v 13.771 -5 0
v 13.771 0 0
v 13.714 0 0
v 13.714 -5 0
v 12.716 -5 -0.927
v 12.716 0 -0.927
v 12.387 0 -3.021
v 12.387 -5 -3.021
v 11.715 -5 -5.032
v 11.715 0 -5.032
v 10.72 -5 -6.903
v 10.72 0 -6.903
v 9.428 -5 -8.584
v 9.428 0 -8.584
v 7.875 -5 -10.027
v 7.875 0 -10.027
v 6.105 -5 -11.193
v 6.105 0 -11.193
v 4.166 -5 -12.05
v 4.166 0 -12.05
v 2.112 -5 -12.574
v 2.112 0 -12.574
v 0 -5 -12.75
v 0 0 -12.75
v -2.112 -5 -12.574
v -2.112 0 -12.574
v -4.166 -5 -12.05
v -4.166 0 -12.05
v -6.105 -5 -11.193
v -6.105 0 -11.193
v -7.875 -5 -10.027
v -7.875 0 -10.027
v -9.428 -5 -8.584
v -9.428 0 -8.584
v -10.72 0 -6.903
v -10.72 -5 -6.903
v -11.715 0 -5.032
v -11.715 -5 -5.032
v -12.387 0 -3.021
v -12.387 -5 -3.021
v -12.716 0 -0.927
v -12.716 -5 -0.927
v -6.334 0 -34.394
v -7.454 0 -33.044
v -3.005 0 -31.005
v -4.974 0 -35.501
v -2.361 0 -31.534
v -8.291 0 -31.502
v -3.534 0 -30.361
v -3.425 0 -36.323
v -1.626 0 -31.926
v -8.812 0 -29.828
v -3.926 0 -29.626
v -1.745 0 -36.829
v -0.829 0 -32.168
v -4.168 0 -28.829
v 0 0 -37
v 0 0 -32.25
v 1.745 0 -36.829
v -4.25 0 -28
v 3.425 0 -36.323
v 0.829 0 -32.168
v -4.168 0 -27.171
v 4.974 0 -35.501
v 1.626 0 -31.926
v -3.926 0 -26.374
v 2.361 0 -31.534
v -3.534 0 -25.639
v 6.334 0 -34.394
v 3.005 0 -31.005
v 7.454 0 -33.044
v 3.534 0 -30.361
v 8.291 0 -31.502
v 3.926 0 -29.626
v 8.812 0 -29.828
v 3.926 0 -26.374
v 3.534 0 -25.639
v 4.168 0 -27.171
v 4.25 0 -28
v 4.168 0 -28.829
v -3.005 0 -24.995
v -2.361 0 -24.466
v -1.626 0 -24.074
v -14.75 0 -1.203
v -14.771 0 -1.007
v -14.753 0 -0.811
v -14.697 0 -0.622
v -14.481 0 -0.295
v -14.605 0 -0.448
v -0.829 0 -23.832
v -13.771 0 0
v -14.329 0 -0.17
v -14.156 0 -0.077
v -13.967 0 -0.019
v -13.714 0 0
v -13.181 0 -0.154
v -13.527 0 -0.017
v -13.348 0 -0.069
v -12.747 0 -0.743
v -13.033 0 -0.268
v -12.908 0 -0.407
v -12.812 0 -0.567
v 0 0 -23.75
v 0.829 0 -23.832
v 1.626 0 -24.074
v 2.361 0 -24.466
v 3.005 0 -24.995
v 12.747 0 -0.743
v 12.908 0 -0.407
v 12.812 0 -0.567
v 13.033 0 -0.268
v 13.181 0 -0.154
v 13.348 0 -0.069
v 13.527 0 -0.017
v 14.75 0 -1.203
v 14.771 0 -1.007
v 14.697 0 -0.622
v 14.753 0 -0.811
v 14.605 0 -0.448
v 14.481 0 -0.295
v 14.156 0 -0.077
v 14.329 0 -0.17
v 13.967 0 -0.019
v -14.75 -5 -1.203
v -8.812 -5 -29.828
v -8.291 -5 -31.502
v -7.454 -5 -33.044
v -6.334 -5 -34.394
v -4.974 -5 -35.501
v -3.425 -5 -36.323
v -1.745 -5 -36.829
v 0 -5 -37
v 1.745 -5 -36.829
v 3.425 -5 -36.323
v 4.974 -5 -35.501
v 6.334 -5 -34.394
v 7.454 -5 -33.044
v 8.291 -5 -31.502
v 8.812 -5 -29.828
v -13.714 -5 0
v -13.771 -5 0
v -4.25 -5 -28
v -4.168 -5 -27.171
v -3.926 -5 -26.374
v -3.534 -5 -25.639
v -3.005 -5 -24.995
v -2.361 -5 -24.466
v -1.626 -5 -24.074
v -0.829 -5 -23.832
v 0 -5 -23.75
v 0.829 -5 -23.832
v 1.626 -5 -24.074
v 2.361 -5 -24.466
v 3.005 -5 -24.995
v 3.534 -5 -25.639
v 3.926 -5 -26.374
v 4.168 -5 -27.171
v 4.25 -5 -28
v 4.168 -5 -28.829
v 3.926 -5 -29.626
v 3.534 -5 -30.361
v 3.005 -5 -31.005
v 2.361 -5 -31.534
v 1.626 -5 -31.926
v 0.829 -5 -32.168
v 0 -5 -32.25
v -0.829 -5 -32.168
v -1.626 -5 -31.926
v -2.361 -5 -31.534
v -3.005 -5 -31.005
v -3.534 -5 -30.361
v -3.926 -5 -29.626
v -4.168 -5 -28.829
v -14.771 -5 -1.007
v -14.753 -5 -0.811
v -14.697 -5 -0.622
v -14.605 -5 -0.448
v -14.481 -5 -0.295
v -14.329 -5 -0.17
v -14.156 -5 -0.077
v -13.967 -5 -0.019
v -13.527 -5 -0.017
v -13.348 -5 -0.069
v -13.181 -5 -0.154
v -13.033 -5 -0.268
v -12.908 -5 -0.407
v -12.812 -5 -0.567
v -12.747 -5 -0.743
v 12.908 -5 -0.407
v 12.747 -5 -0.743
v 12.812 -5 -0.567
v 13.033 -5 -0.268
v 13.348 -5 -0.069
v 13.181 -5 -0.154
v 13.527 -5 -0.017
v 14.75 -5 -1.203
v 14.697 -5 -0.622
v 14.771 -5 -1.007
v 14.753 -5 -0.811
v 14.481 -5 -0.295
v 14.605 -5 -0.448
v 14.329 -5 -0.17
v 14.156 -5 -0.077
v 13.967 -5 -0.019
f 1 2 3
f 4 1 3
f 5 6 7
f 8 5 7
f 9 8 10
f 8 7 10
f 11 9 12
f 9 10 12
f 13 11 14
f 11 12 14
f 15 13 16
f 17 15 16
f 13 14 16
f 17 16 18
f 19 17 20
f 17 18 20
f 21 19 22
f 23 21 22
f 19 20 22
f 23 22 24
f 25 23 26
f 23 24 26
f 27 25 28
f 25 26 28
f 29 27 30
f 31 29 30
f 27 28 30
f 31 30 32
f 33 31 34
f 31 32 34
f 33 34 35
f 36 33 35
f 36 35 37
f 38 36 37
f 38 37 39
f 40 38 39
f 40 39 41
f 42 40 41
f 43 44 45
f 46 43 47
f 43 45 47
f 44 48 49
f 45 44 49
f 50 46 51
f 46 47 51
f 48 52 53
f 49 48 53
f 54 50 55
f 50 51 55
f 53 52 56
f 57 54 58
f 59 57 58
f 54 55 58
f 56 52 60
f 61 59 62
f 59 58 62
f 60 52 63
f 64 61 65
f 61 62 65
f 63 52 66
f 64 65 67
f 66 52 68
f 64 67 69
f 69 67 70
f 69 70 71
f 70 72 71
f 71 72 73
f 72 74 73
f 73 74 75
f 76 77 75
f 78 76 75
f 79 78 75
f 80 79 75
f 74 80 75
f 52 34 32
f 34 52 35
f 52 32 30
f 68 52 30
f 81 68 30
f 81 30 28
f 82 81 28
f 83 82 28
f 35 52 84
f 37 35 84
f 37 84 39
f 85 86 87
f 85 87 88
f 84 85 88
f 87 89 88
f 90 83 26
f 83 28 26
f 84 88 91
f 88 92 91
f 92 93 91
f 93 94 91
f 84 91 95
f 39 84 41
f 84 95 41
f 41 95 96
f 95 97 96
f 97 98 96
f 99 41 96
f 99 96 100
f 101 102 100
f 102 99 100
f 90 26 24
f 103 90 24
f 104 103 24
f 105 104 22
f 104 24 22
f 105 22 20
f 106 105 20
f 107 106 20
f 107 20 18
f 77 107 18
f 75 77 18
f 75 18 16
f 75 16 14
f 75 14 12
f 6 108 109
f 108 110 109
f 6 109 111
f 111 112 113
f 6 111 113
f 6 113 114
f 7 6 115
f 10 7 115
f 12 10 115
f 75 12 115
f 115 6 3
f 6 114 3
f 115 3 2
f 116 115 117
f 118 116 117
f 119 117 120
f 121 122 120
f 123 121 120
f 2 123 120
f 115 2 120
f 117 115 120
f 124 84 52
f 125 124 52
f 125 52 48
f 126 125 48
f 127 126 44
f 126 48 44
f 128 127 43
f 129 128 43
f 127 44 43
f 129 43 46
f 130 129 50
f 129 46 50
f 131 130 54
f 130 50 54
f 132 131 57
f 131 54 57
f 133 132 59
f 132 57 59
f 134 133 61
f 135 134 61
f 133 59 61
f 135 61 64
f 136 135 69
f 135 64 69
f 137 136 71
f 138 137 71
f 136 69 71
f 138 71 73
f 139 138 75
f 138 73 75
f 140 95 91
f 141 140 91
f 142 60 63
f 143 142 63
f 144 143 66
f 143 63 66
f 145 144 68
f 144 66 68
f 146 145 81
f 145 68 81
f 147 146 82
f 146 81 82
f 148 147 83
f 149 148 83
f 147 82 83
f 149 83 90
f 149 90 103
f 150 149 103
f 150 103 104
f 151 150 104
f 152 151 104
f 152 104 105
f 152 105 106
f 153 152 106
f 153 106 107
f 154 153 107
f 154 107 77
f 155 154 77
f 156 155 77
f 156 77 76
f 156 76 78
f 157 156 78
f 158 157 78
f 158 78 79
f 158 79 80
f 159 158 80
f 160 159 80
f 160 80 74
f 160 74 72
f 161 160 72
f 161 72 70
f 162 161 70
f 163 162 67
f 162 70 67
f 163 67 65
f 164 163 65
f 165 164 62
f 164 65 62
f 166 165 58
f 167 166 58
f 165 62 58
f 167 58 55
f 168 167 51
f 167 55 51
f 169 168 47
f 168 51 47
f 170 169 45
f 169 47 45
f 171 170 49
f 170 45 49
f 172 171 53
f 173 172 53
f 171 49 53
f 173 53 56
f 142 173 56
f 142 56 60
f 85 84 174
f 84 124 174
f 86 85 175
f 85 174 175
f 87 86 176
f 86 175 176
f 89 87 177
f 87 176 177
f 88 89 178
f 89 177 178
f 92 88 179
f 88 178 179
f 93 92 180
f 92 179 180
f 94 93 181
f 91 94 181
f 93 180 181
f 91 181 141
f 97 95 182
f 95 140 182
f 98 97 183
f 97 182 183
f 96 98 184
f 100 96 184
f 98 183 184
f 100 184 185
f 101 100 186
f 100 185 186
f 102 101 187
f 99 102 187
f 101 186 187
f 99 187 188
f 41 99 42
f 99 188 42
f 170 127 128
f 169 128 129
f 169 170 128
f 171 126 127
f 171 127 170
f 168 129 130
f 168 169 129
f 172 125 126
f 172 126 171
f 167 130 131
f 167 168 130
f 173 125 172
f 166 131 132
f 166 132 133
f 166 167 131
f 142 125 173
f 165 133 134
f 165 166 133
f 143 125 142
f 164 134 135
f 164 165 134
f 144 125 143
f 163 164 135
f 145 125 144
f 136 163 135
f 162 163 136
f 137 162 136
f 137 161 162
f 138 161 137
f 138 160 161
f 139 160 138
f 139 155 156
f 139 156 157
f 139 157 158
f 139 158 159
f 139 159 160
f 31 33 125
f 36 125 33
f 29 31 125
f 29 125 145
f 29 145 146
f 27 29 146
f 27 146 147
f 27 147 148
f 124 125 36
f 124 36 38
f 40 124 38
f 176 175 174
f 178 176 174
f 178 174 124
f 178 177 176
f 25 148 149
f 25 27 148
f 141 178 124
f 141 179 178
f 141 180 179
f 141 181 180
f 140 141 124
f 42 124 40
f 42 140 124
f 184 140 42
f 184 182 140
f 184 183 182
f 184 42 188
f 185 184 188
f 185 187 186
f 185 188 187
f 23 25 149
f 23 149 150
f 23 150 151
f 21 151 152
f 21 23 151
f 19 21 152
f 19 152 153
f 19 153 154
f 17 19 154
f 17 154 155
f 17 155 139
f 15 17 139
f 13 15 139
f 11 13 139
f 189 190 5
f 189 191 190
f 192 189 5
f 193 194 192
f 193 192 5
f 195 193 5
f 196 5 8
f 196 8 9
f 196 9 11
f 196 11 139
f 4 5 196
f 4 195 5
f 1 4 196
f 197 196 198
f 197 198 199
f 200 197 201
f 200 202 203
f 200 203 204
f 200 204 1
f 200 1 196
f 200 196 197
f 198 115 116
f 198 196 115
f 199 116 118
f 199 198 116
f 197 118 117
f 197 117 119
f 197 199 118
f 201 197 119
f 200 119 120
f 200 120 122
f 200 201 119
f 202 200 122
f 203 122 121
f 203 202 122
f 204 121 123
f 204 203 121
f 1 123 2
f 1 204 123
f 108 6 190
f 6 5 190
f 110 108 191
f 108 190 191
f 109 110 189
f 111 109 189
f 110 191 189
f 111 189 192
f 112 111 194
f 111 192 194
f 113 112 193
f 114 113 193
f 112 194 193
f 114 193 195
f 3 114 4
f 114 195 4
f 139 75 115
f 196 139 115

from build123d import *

# Parameters (mm, degrees)
F1_DEPTH = 5
F3_D     = 8.5
F4_R     = 1


with BuildPart() as f1:
    # F0 (on Front) → F1 (new body)
    with BuildSketch(Plane.XZ):
        with BuildLine():
            Line((-15, 0), (-8.812388, -29.828065))
            ThreePointArc((-8.812388, -29.828065), (0, -37), (8.812388, -29.828065))
            Line((8.812388, -29.828065), (15, 0))
            Line((15, 0), (12.75, 0))
            ThreePointArc((12.75, 0), (0, -12.75), (-12.75, 0))
            Line((-12.75, 0), (-15, 0))
        make_face()
    extrude(amount=F1_DEPTH)

    # F3 (through all)
    with Locations(Plane.XZ.offset(5)):
        with Locations((0, -28)):
            Hole(F3_D / 2)

    # F4
    f4_edges = [f1.edges().sort_by_distance(p)[0] for p in [
        (15, -2.5, 0),
        (-15, -2.5, 0),
        (-12.75, -2.5, 0),
        (12.75, -2.5, 0),
    ]]
    fillet(f4_edges, radius=F4_R)


solid = f1.part
